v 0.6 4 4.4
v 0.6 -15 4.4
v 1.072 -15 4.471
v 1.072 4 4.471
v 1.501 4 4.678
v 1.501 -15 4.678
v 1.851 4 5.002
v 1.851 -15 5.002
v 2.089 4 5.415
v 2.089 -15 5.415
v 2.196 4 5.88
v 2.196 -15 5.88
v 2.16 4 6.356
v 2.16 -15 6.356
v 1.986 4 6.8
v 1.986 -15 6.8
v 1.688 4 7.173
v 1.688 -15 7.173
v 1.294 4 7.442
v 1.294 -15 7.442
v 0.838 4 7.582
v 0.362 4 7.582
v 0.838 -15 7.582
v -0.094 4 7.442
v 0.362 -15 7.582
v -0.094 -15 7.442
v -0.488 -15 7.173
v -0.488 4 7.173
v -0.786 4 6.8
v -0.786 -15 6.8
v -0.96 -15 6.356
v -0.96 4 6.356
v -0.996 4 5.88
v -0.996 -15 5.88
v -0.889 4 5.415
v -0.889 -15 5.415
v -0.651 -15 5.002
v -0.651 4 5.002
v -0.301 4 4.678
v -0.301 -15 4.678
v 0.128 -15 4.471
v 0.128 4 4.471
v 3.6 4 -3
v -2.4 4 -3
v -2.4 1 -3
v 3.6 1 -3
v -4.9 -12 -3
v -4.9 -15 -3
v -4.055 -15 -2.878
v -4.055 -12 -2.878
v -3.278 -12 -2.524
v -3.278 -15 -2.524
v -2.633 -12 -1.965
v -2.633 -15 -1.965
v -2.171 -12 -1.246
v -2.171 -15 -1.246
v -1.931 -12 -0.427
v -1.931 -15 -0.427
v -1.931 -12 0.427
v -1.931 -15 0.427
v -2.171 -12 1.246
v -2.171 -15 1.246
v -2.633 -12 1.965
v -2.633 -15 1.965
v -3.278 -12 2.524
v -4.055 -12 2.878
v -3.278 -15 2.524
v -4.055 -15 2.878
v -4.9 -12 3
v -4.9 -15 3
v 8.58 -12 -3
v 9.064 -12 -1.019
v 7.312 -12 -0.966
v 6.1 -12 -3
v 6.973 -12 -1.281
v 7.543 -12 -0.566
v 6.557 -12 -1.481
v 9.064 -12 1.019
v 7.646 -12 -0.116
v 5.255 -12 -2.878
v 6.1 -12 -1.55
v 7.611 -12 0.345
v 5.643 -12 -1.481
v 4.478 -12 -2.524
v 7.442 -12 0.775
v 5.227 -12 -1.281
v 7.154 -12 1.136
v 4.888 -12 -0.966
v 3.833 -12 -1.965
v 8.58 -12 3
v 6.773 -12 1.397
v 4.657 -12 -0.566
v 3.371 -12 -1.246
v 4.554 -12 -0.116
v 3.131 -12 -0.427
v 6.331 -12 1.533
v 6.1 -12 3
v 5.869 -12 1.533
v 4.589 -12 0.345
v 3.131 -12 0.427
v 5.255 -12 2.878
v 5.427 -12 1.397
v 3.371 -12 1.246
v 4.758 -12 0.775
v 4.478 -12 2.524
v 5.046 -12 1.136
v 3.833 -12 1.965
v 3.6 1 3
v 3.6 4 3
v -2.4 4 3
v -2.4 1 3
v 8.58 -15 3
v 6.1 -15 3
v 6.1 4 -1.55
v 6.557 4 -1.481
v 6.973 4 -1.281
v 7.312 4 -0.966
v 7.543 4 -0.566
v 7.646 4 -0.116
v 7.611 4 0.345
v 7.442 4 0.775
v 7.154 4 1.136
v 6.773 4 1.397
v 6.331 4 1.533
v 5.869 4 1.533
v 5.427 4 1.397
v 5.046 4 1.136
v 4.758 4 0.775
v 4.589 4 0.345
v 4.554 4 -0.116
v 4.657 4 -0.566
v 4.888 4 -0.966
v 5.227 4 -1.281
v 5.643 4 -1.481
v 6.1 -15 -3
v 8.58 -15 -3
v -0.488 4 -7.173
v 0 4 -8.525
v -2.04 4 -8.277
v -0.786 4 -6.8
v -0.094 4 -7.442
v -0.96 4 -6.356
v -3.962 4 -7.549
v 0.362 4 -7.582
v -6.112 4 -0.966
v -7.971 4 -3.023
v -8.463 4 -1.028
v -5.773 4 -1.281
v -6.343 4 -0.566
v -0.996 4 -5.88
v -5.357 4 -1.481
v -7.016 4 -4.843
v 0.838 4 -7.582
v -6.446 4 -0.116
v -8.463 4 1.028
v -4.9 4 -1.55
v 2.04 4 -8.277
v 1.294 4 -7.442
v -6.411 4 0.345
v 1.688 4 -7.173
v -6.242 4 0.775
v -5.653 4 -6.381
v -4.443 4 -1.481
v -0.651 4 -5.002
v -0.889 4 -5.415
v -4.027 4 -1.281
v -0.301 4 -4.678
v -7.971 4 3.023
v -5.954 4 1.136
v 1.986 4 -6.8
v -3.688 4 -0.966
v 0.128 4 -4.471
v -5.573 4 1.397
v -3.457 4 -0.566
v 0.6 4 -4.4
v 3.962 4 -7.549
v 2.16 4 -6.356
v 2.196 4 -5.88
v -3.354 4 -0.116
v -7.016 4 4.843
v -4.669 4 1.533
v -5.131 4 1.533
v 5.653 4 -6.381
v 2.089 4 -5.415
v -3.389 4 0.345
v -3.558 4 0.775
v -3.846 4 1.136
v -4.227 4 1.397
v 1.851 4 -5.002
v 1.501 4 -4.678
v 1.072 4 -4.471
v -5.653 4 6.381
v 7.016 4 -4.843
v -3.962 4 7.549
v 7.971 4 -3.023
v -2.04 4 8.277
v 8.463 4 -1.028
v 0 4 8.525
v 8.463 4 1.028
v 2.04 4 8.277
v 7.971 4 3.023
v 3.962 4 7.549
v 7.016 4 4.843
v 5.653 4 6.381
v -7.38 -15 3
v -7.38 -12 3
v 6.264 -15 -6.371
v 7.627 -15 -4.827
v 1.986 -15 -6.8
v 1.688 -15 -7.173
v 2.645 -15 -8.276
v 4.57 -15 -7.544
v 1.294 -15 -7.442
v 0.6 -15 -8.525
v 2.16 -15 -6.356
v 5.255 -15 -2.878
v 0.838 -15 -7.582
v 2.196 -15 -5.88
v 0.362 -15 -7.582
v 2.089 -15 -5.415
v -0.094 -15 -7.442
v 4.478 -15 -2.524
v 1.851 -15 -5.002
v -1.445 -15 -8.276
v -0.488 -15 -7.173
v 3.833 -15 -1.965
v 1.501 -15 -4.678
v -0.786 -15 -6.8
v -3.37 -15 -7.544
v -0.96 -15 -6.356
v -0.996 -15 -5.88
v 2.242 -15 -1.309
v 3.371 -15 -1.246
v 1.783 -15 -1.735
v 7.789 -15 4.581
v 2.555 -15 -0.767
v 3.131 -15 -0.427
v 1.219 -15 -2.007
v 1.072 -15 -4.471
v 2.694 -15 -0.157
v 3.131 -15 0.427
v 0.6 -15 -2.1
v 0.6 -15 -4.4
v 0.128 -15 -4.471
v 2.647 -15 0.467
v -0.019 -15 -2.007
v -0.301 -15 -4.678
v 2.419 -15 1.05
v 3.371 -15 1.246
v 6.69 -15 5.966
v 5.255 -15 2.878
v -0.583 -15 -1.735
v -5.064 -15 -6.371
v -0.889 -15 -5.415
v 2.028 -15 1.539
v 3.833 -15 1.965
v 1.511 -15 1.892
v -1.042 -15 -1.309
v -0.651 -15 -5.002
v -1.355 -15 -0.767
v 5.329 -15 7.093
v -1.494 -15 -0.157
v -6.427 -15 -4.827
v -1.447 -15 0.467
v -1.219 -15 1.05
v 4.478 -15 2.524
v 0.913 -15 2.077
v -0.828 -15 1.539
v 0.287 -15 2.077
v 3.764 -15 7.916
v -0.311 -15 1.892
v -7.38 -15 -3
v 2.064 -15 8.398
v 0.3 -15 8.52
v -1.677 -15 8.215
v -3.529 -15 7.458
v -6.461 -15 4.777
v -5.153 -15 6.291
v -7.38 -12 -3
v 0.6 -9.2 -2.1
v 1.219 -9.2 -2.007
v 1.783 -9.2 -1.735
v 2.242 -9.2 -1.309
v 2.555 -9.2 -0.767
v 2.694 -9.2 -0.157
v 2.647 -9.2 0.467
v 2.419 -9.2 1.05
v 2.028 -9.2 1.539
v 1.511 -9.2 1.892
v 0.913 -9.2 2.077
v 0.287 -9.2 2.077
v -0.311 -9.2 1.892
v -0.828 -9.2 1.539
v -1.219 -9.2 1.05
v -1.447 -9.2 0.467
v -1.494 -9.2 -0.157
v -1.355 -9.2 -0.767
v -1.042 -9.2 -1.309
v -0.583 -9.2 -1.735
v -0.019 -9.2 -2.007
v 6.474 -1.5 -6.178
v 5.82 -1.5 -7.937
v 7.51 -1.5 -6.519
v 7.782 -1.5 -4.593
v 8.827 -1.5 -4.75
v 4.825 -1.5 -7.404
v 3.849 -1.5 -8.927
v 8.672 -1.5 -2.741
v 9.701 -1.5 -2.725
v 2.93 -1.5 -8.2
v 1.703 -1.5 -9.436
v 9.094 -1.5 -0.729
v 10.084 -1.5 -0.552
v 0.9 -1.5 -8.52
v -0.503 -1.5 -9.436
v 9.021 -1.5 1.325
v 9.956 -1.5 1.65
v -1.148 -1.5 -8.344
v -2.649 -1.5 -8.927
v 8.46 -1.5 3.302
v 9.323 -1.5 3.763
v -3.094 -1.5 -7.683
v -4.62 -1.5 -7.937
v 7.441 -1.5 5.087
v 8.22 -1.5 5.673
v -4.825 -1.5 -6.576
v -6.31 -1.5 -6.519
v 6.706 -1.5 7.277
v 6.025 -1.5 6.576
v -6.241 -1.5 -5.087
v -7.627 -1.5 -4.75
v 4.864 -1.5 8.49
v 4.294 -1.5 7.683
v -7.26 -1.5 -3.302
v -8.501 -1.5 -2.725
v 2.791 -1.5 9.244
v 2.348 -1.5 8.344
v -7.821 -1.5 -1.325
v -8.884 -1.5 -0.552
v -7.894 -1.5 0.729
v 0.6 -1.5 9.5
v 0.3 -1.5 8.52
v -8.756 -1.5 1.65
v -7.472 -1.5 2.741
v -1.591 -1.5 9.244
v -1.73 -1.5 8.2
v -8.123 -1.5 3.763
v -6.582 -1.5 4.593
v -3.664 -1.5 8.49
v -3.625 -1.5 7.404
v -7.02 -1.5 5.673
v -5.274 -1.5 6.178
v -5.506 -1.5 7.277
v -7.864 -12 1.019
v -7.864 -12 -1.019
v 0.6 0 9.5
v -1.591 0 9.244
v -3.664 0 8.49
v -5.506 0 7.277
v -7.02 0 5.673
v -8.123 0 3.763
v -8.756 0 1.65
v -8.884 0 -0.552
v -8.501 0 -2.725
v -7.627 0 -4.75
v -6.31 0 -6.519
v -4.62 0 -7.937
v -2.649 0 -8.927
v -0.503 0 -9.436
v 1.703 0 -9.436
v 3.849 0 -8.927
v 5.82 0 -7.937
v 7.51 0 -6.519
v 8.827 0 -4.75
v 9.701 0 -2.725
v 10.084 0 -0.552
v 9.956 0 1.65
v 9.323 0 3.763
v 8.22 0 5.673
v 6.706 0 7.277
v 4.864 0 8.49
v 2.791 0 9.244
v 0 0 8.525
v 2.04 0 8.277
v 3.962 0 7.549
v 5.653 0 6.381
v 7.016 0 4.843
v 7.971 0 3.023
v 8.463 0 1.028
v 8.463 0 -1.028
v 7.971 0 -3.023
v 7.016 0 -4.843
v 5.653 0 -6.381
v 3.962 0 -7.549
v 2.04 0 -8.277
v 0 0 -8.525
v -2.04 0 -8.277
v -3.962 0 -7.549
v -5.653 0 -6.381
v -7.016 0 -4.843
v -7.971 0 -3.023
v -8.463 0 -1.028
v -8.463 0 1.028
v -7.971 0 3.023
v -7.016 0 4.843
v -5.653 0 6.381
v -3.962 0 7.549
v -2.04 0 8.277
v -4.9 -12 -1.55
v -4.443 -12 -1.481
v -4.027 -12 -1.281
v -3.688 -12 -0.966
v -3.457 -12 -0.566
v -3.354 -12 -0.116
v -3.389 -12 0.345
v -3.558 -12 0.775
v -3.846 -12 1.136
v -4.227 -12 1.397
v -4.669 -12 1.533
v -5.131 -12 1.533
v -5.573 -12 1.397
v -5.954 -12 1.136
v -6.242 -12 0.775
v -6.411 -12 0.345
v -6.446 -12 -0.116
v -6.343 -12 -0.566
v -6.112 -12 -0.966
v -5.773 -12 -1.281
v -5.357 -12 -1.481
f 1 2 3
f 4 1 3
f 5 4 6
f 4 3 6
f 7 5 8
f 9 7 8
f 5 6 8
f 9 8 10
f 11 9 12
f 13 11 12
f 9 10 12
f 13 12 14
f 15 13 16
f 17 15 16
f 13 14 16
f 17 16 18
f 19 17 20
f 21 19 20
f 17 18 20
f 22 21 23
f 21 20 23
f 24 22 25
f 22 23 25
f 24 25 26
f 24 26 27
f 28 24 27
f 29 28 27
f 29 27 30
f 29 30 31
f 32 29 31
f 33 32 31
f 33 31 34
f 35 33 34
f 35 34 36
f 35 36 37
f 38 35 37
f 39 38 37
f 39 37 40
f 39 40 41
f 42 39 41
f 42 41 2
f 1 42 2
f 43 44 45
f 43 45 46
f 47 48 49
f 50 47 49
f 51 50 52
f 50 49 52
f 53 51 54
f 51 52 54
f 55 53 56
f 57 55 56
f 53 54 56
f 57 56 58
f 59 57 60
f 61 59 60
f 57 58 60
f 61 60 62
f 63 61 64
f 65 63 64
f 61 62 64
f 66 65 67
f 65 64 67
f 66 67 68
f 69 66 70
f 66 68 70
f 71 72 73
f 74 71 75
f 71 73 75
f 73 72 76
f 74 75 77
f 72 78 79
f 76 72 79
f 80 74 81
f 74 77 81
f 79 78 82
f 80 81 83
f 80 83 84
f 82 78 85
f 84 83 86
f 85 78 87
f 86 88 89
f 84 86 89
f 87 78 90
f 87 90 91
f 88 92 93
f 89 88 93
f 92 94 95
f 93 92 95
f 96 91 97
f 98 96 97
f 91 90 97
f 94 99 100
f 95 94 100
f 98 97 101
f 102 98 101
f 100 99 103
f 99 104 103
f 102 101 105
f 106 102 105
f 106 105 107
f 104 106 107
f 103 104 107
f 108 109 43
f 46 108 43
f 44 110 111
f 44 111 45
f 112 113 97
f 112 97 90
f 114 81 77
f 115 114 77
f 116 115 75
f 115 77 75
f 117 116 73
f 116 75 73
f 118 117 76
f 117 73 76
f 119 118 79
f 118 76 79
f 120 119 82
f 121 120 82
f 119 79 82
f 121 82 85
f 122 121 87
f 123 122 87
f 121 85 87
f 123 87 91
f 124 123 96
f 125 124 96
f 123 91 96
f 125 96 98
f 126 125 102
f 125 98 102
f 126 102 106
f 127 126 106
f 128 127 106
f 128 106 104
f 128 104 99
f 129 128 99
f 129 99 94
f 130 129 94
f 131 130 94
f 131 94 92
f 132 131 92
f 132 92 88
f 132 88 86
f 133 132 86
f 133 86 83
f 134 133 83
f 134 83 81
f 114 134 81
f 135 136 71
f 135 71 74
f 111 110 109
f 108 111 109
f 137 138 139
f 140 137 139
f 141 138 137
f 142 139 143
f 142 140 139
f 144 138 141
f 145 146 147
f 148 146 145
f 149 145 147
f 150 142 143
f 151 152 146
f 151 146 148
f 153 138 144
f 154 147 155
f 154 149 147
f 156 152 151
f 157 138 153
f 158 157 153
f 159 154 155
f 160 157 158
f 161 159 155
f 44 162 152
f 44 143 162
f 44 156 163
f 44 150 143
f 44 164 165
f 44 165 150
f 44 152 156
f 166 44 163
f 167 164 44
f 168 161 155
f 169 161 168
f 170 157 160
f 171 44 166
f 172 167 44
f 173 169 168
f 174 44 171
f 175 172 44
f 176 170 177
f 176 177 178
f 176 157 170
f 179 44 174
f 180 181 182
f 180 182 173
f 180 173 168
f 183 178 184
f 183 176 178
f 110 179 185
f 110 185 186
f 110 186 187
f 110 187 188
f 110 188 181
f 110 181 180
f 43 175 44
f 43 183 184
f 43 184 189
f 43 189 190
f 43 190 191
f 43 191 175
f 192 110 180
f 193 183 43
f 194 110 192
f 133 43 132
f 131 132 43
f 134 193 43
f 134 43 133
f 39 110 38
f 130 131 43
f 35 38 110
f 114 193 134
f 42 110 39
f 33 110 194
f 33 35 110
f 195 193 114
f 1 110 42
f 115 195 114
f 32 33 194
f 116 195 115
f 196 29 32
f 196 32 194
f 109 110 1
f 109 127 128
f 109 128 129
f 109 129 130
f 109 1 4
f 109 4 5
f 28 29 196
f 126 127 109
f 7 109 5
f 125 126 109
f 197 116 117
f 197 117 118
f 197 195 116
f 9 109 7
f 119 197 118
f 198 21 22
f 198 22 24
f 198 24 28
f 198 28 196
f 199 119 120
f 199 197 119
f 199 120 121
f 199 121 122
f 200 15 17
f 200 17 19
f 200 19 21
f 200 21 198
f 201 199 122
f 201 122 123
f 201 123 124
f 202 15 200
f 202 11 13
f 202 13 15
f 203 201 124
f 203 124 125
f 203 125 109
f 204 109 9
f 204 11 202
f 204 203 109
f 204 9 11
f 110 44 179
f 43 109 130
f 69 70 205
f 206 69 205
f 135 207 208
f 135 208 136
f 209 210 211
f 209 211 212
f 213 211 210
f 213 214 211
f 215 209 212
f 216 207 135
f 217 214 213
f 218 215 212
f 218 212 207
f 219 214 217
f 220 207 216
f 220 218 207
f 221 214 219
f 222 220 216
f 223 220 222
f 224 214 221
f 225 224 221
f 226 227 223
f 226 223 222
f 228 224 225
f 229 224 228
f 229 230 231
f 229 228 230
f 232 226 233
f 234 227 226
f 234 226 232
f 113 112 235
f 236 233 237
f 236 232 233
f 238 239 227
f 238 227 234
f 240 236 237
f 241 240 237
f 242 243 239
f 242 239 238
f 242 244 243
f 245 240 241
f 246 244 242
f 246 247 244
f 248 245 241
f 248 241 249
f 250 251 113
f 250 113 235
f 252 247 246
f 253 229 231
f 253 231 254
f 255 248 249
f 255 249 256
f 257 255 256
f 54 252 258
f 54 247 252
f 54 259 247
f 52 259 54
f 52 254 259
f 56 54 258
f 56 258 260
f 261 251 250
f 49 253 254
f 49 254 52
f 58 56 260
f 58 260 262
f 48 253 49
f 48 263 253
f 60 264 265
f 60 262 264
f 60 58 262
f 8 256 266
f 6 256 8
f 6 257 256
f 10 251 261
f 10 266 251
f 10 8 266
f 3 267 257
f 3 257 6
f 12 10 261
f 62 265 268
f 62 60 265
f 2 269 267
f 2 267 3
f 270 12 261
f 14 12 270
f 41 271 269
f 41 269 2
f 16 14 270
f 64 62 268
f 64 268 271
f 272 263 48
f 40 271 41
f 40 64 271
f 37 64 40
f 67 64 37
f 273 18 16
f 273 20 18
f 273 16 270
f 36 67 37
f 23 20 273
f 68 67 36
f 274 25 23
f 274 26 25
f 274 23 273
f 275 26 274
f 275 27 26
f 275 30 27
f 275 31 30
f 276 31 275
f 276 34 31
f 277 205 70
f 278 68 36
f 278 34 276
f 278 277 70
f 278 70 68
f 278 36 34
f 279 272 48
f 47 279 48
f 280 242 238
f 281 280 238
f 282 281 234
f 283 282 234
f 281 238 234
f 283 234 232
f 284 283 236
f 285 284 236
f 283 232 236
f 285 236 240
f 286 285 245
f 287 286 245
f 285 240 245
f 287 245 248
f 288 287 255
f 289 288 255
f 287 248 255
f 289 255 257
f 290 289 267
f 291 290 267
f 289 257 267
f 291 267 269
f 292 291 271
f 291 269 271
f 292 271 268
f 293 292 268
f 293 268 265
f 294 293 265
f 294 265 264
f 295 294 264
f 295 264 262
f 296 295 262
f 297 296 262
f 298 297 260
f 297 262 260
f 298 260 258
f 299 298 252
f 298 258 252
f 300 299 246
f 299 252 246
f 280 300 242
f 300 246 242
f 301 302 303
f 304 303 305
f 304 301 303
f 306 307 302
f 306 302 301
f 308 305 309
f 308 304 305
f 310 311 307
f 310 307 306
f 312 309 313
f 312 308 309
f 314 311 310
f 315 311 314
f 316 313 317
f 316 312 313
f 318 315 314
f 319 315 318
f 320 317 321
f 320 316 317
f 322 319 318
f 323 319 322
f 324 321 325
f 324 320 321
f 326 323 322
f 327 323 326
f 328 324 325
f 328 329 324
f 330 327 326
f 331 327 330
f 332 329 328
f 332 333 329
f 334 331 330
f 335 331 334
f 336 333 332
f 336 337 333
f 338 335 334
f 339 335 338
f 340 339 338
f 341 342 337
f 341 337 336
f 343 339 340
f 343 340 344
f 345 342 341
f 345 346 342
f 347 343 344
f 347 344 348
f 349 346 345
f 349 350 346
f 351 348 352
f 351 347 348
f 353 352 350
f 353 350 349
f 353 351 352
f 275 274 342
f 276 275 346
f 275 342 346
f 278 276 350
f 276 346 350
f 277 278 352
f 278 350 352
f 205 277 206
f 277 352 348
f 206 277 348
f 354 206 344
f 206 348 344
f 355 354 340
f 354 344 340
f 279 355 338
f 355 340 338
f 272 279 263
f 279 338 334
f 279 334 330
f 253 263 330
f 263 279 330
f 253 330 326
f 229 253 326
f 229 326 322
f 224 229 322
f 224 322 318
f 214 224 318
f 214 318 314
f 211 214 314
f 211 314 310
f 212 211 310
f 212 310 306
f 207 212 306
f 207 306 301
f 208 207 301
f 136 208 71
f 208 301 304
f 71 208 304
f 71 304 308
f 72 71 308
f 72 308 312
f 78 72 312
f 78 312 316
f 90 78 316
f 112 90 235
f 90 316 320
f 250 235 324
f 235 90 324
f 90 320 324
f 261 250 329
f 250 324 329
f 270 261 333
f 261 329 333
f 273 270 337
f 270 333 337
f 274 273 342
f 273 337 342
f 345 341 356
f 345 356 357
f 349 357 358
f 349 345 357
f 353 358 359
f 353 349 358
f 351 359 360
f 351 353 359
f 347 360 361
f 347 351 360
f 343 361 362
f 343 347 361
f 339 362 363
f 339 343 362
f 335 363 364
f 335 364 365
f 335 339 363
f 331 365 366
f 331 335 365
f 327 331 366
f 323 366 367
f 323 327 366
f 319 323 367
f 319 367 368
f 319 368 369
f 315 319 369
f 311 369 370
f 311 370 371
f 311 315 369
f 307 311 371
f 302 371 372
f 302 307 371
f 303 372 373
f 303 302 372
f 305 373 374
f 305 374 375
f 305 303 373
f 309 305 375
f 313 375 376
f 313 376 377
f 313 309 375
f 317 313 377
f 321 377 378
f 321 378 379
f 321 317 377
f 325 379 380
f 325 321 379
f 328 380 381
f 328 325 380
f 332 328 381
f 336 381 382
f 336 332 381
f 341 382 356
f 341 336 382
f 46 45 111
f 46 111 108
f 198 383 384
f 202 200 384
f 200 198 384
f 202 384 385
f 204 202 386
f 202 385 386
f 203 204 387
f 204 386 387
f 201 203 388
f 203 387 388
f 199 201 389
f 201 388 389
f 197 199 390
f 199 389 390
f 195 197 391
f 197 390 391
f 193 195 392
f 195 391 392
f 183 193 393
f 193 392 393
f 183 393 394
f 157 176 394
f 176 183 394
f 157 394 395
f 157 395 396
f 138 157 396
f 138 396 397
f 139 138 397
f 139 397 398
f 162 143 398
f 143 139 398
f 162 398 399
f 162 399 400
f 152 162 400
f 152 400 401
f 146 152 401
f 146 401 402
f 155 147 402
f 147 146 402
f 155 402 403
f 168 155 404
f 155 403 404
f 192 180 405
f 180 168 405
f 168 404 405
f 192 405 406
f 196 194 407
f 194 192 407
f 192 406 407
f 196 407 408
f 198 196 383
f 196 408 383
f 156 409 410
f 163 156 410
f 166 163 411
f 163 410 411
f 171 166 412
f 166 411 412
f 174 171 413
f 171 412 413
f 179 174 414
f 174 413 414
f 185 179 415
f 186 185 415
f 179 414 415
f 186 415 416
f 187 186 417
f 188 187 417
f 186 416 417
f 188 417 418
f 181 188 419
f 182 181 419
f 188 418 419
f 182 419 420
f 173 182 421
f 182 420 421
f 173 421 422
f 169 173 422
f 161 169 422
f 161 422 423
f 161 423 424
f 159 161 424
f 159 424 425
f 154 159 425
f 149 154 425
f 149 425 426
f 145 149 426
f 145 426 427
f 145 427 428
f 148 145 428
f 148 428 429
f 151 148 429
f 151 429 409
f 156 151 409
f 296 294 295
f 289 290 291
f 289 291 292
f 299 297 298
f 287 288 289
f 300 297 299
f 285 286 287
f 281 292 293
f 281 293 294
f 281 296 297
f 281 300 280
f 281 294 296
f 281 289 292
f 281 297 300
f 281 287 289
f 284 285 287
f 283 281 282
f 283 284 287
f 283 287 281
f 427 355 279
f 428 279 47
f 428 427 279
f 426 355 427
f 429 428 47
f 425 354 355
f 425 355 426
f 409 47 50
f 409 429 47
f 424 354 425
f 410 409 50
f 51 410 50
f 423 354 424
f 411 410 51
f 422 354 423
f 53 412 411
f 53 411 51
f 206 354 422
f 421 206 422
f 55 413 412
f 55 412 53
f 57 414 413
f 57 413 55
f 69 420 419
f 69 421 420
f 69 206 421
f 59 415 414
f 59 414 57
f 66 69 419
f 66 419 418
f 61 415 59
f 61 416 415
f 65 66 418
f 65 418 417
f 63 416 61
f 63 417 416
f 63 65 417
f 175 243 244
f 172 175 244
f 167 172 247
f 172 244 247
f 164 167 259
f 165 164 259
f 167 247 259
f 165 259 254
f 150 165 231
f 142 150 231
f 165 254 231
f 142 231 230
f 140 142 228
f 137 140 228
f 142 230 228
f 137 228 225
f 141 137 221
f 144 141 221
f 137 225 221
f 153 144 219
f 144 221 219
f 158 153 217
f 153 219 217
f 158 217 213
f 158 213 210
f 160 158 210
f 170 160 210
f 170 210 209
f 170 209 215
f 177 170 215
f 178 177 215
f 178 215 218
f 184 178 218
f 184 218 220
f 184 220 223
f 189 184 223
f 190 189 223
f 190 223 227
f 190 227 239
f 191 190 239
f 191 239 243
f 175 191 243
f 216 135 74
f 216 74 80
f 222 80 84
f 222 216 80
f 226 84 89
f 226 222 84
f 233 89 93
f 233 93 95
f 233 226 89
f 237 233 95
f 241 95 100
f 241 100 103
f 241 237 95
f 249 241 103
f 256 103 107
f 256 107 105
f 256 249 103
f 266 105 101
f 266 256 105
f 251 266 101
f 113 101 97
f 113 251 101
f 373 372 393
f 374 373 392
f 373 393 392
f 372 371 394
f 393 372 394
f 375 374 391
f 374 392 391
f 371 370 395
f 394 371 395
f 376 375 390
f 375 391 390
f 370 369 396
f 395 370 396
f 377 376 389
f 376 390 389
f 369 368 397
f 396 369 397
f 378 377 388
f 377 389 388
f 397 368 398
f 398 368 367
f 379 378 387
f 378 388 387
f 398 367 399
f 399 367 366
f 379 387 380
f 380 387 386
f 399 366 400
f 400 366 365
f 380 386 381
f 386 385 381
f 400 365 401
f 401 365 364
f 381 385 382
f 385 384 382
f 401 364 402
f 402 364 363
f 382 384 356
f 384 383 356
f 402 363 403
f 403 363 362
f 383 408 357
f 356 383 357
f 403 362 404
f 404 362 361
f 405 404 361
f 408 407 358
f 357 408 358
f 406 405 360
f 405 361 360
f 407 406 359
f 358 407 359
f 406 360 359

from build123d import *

# Parameters (mm, degrees)
SKETCH1_R            = 8.525
BOSS_EXTRUDE11_DEPTH = 4
SKETCH20_R           = 8.575
BOSS_EXTRUDE12_DEPTH = 4
SKETCH21_R           = 9.5
BOSS_EXTRUDE13_DEPTH = 1.25
SKETCH22_R           = 8.55
BOSS_EXTRUDE14_DEPTH = 7
SKETCH30_R           = 8.525
BOSS_EXTRUDE15_DEPTH = 15
SKETCH33_R           = 2.1
CUT_EXTRUDE14_DEPTH  = 5.8
BOSS_EXTRUDE16_START = 1.5
SKETCH35_R           = 9.5
BOSS_EXTRUDE16_DEPTH = 1.5
SKETCH36_R           = 1.6
CUT_EXTRUDE15_DEPTH  = 31.25
CIRPATTERN1_COUNT    = 2
SKETCH43_R           = 1.55
CUT_EXTRUDE20_DEPTH  = 31.25
SKETCH44_R           = 2
CUT_EXTRUDE21_DEPTH  = 4
CUT_EXTRUDE22_DEPTH  = 3
CUT_EXTRUDE23_DEPTH  = 3
SKETCH47_W           = 22.343806143
SKETCH47_H           = 21.789827479
CUT_EXTRUDE24_DEPTH  = 12.25
SKETCH48_W           = 6
SKETCH48_H           = 6
CUT_EXTRUDE25_DEPTH  = 3


with BuildPart() as part:
    # Sketch1 → Boss-Extrude11 (new body)
    with BuildSketch(Plane(origin=(0, 0, 0), x_dir=(1, 0, 0), z_dir=(0, 1, 0))):
        with Locations(Location((0, 0, 0), (0, 0, 270))):
            Circle(SKETCH1_R)
    extrude(amount=BOSS_EXTRUDE11_DEPTH)

    # Sketch20 → Boss-Extrude12 (add)
    with BuildSketch(Plane(origin=(0, 4, 0), x_dir=(1, 0, 0), z_dir=(0, 1, 0))):
        with Locations(Location((1.2, 0, 0), (0, 0, 96.402715722))):
            Circle(SKETCH20_R)
    extrude(amount=BOSS_EXTRUDE12_DEPTH)

    # Sketch21 → Boss-Extrude13 (add)
    with BuildSketch(Plane(origin=(0, 8, 0), x_dir=(1, 0, 0), z_dir=(0, 1, 0))):
        with Locations(Location((0.6, 0, 0), (0, 0, 270))):
            Circle(SKETCH21_R)
    extrude(amount=BOSS_EXTRUDE13_DEPTH)

    # Sketch22 → Boss-Extrude14 (add)
    with BuildSketch(Plane(origin=(0, 9.25, 0), x_dir=(1, 0, 0), z_dir=(0, 1, 0))):
        with Locations(Location((0.6, 0, 0), (0, 0, 270))):
            Circle(SKETCH22_R)
    extrude(amount=BOSS_EXTRUDE14_DEPTH)

    # Sketch30 → Boss-Extrude15 (add)
    with BuildSketch(Plane.XZ):
        with Locations(Location((0.6, 0, 0), (0, 0, 92.01669015))):
            Circle(SKETCH30_R)
    extrude(amount=BOSS_EXTRUDE15_DEPTH)

    # Sketch33 → Cut-Extrude14 (cut)
    with BuildSketch(Plane.XZ.offset(15)):
        with Locations(Location((0.6, 0, 0), (0, 0, 270))):
            Circle(SKETCH33_R)
    extrude(amount=-CUT_EXTRUDE14_DEPTH, mode=Mode.SUBTRACT)

    # Sketch35 → Boss-Extrude16 (add)
    with BuildSketch(Plane.XZ.offset(BOSS_EXTRUDE16_START)):
        with Locations(Location((0.6, 0, 0), (0, 0, 90))):
            Circle(SKETCH35_R)
    extrude(amount=-BOSS_EXTRUDE16_DEPTH)

    # Sketch36 → Cut-Extrude15 (cut)
    with BuildSketch(Plane.XZ.offset(15)):
        with Locations(Location((0.6, 6, 0), (0, 0, 270))):
            Circle(SKETCH36_R)
    cut_extrude15 = extrude(amount=-CUT_EXTRUDE15_DEPTH, mode=Mode.SUBTRACT)

    # CirPattern1: Cut-Extrude15 ×2 about axis
    cirpattern1_axis = Axis((0.6, 0, 0), (0, 1, 0))
    for i in range(1, CIRPATTERN1_COUNT):
        add(cut_extrude15.rotate(cirpattern1_axis, i * 360 / CIRPATTERN1_COUNT), mode=Mode.SUBTRACT)

    # Sketch43 → Cut-Extrude20 (cut)
    with BuildSketch(Plane.XZ.offset(15)):
        with Locations(Location((-4.9, 0, 0), (0, 0, 270))):
            Circle(SKETCH43_R)
        with Locations(Location((6.1, 0, 0), (0, 0, 270))):
            Circle(SKETCH43_R)
    extrude(amount=-CUT_EXTRUDE20_DEPTH, mode=Mode.SUBTRACT)

    # Sketch44 → Cut-Extrude21 (cut)
    with BuildSketch(Plane(origin=(0, 16.25, 0), x_dir=(1, 0, 0), z_dir=(0, 1, 0))):
        with Locations(Location((-4.9, 0, 0), (0, 0, 270))):
            Circle(SKETCH44_R)
        with Locations(Location((6.1, 0, 0), (0, 0, 270))):
            Circle(SKETCH44_R)
    extrude(amount=-CUT_EXTRUDE21_DEPTH, mode=Mode.SUBTRACT)

    # Sketch45 → Cut-Extrude22 (cut)
    with BuildSketch(Plane(origin=(0, 16.25, 0), x_dir=(1, 0, 0), z_dir=(0, 1, 0))):
        with BuildLine():
            Line((-2.4, -6), (-2.4, -10.872564071))
            Line((-2.4, -10.872564071), (3.6, -10.872564071))
            Line((3.6, -10.872564071), (3.6, -6))
            ThreePointArc((3.6, -6), (0.6, -3), (-2.4, -6))
        make_face()
        with BuildLine():
            Line((-2.4, 6), (-2.4, 11.42214608))
            Line((-2.4, 11.42214608), (3.6, 11.42214608))
            Line((3.6, 11.42214608), (3.6, 6))
            ThreePointArc((3.6, 6), (0.6, 3), (-2.4, 6))
        make_face()
    extrude(amount=-CUT_EXTRUDE22_DEPTH, mode=Mode.SUBTRACT)

    # Sketch46 → Cut-Extrude23 (cut)
    with BuildSketch(Plane.XZ.offset(15)):
        with BuildLine():
            Line((-4.9, 3), (-9.719928829, 3))
            Line((-9.719928829, 3), (-9.719928829, -3))
            Line((-9.719928829, -3), (-4.9, -3))
            ThreePointArc((-4.9, -3), (-1.9, 0), (-4.9, 3))
        make_face()
        with BuildLine():
            Line((6.1, 3), (10.889396495, 3))
            Line((10.889396495, 3), (10.889396495, -3))
            Line((10.889396495, -3), (6.1, -3))
            ThreePointArc((6.1, -3), (3.1, 0), (6.1, 3))
        make_face()
    extrude(amount=-CUT_EXTRUDE23_DEPTH, mode=Mode.SUBTRACT)

    # Sketch47 → Cut-Extrude24 (cut)
    with BuildSketch(Plane(origin=(0, 16.25, 0), x_dir=(1, 0, 0), z_dir=(0, 1, 0))):
        with Locations((0.37577054, -0.013189968)):
            Rectangle(SKETCH47_W, SKETCH47_H)
    extrude(amount=-CUT_EXTRUDE24_DEPTH, mode=Mode.SUBTRACT)

    # Sketch48 → Cut-Extrude25 (cut)
    with BuildSketch(Plane(origin=(0, 4, 0), x_dir=(1, 0, 0), z_dir=(0, 1, 0))):
        with Locations((0.6, 0)):
            Rectangle(SKETCH48_W, SKETCH48_H)
    extrude(amount=-CUT_EXTRUDE25_DEPTH, mode=Mode.SUBTRACT)


solid = part.part
